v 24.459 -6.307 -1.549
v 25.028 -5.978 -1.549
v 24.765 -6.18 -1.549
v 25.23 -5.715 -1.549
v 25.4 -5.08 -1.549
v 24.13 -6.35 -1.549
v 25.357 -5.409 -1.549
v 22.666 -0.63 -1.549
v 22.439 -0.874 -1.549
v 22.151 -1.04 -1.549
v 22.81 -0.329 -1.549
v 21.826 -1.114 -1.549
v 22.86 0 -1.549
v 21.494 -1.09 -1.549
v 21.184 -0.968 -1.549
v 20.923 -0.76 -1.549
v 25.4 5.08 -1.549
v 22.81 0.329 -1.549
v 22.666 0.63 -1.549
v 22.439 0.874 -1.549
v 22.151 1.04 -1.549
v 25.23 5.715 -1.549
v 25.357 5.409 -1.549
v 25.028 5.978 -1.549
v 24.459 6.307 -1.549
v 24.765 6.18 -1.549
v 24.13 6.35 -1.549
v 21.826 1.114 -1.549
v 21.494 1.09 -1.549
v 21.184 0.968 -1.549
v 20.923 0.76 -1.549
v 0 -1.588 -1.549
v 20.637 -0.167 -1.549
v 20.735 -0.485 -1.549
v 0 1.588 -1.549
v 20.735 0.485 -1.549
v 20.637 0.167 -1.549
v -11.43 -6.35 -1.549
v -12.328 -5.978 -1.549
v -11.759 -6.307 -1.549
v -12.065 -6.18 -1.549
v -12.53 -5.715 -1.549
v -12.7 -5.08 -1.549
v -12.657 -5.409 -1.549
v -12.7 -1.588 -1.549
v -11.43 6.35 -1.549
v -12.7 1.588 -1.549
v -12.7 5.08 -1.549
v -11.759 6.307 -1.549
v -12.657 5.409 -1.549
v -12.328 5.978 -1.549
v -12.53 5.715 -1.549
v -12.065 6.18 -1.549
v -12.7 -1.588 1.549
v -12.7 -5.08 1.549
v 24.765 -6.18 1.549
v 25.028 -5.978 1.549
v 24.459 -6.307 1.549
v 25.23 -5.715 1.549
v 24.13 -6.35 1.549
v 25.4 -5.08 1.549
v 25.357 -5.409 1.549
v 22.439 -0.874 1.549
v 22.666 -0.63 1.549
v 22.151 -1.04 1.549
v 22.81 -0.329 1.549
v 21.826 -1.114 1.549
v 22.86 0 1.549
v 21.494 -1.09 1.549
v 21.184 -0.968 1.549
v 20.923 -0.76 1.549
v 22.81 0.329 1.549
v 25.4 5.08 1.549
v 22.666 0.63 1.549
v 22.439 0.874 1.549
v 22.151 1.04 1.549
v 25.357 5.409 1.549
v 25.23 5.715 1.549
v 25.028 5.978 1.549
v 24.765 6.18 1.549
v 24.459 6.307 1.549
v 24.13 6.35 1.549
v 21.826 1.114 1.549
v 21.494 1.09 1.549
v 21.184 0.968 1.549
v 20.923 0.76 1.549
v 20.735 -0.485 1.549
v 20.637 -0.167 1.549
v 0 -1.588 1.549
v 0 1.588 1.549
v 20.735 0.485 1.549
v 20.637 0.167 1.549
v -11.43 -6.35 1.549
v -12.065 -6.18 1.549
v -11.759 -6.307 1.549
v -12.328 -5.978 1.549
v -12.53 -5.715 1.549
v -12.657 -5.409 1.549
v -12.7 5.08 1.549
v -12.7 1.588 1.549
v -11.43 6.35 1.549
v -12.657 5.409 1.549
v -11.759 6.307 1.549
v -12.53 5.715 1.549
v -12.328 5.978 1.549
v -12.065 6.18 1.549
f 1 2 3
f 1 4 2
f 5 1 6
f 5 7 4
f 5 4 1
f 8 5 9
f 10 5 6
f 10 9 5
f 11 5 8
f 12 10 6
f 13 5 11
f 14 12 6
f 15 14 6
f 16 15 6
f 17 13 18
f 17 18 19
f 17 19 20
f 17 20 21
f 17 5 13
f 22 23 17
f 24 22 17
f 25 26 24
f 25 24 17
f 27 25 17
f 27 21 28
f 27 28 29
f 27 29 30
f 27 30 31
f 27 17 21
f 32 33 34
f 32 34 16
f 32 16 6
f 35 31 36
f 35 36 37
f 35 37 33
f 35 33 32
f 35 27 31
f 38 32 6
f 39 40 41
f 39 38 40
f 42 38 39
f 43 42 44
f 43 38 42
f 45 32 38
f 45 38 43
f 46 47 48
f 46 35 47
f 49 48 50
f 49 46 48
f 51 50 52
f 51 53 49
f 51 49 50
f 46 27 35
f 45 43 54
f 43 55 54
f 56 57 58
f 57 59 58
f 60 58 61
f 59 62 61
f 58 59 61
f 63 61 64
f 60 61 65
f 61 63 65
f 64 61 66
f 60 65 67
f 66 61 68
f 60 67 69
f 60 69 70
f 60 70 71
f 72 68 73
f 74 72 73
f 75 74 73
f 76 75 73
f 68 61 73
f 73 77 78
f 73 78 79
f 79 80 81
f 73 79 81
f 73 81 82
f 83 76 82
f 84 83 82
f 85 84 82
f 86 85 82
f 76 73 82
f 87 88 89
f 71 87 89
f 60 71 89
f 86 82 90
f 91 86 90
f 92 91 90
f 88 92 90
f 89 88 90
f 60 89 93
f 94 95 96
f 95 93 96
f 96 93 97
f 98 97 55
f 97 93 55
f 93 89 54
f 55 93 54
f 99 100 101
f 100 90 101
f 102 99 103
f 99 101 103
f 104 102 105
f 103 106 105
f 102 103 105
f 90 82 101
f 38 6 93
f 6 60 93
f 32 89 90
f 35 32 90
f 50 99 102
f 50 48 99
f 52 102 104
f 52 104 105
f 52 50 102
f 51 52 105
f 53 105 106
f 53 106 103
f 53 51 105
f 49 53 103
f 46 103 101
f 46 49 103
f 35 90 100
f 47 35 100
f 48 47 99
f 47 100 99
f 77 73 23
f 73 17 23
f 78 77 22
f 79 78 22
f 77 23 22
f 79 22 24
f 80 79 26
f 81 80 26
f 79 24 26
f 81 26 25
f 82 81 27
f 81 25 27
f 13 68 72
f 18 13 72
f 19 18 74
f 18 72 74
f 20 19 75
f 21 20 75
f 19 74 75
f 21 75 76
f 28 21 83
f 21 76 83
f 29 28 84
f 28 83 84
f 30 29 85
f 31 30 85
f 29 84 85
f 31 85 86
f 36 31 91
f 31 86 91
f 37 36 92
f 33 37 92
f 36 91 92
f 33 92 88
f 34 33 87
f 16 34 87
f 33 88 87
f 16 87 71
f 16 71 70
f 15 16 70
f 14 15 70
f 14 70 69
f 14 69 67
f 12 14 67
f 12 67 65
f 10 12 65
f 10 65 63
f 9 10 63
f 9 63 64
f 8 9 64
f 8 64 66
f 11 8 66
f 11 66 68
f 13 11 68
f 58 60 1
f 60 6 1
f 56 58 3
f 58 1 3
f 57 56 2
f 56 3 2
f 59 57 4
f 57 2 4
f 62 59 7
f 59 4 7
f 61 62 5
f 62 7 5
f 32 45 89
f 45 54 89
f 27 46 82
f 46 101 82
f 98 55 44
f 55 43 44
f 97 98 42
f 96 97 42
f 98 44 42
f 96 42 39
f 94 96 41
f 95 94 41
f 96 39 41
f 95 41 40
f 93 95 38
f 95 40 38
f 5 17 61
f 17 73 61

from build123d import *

# Parameters (mm, degrees)
BOSS_EXTRUDE1_DEPTH = 1.5494
FILLET1_R           = 1.27
SKETCH2_R           = 1.1176
CUT_EXTRUDE1_DEPTH  = 27.364465886


with BuildPart() as part:
    # Sketch1 → Boss-Extrude1 (new, symmetric)
    with BuildSketch(Plane.XY):
        Polygon((-12.7, 1.5875), (-12.7, 6.35), (25.4, 6.35), (25.4, -6.35), (-12.7, -6.35), (-12.7, -1.5875), (0, -1.5875), (0, 1.5875), align=None)
    extrude(amount=BOSS_EXTRUDE1_DEPTH, both=True)

    # Fillet1
    fillet1_edges = [part.edges().sort_by_distance(p)[0] for p in [
        (-12.7, 6.35, 0),
        (25.4, 6.35, 0),
        (25.4, -6.35, 0),
        (-12.7, -6.35, 0),
    ]]
    fillet(fillet1_edges, radius=FILLET1_R)

    # Sketch2 → Cut-Extrude1 (cut, through all)
    with BuildSketch(Plane.XY.offset(1.5494)):
        with Locations((21.7424, 0)):
            Circle(SKETCH2_R)
    extrude(amount=-CUT_EXTRUDE1_DEPTH, mode=Mode.SUBTRACT)


solid = part.part
